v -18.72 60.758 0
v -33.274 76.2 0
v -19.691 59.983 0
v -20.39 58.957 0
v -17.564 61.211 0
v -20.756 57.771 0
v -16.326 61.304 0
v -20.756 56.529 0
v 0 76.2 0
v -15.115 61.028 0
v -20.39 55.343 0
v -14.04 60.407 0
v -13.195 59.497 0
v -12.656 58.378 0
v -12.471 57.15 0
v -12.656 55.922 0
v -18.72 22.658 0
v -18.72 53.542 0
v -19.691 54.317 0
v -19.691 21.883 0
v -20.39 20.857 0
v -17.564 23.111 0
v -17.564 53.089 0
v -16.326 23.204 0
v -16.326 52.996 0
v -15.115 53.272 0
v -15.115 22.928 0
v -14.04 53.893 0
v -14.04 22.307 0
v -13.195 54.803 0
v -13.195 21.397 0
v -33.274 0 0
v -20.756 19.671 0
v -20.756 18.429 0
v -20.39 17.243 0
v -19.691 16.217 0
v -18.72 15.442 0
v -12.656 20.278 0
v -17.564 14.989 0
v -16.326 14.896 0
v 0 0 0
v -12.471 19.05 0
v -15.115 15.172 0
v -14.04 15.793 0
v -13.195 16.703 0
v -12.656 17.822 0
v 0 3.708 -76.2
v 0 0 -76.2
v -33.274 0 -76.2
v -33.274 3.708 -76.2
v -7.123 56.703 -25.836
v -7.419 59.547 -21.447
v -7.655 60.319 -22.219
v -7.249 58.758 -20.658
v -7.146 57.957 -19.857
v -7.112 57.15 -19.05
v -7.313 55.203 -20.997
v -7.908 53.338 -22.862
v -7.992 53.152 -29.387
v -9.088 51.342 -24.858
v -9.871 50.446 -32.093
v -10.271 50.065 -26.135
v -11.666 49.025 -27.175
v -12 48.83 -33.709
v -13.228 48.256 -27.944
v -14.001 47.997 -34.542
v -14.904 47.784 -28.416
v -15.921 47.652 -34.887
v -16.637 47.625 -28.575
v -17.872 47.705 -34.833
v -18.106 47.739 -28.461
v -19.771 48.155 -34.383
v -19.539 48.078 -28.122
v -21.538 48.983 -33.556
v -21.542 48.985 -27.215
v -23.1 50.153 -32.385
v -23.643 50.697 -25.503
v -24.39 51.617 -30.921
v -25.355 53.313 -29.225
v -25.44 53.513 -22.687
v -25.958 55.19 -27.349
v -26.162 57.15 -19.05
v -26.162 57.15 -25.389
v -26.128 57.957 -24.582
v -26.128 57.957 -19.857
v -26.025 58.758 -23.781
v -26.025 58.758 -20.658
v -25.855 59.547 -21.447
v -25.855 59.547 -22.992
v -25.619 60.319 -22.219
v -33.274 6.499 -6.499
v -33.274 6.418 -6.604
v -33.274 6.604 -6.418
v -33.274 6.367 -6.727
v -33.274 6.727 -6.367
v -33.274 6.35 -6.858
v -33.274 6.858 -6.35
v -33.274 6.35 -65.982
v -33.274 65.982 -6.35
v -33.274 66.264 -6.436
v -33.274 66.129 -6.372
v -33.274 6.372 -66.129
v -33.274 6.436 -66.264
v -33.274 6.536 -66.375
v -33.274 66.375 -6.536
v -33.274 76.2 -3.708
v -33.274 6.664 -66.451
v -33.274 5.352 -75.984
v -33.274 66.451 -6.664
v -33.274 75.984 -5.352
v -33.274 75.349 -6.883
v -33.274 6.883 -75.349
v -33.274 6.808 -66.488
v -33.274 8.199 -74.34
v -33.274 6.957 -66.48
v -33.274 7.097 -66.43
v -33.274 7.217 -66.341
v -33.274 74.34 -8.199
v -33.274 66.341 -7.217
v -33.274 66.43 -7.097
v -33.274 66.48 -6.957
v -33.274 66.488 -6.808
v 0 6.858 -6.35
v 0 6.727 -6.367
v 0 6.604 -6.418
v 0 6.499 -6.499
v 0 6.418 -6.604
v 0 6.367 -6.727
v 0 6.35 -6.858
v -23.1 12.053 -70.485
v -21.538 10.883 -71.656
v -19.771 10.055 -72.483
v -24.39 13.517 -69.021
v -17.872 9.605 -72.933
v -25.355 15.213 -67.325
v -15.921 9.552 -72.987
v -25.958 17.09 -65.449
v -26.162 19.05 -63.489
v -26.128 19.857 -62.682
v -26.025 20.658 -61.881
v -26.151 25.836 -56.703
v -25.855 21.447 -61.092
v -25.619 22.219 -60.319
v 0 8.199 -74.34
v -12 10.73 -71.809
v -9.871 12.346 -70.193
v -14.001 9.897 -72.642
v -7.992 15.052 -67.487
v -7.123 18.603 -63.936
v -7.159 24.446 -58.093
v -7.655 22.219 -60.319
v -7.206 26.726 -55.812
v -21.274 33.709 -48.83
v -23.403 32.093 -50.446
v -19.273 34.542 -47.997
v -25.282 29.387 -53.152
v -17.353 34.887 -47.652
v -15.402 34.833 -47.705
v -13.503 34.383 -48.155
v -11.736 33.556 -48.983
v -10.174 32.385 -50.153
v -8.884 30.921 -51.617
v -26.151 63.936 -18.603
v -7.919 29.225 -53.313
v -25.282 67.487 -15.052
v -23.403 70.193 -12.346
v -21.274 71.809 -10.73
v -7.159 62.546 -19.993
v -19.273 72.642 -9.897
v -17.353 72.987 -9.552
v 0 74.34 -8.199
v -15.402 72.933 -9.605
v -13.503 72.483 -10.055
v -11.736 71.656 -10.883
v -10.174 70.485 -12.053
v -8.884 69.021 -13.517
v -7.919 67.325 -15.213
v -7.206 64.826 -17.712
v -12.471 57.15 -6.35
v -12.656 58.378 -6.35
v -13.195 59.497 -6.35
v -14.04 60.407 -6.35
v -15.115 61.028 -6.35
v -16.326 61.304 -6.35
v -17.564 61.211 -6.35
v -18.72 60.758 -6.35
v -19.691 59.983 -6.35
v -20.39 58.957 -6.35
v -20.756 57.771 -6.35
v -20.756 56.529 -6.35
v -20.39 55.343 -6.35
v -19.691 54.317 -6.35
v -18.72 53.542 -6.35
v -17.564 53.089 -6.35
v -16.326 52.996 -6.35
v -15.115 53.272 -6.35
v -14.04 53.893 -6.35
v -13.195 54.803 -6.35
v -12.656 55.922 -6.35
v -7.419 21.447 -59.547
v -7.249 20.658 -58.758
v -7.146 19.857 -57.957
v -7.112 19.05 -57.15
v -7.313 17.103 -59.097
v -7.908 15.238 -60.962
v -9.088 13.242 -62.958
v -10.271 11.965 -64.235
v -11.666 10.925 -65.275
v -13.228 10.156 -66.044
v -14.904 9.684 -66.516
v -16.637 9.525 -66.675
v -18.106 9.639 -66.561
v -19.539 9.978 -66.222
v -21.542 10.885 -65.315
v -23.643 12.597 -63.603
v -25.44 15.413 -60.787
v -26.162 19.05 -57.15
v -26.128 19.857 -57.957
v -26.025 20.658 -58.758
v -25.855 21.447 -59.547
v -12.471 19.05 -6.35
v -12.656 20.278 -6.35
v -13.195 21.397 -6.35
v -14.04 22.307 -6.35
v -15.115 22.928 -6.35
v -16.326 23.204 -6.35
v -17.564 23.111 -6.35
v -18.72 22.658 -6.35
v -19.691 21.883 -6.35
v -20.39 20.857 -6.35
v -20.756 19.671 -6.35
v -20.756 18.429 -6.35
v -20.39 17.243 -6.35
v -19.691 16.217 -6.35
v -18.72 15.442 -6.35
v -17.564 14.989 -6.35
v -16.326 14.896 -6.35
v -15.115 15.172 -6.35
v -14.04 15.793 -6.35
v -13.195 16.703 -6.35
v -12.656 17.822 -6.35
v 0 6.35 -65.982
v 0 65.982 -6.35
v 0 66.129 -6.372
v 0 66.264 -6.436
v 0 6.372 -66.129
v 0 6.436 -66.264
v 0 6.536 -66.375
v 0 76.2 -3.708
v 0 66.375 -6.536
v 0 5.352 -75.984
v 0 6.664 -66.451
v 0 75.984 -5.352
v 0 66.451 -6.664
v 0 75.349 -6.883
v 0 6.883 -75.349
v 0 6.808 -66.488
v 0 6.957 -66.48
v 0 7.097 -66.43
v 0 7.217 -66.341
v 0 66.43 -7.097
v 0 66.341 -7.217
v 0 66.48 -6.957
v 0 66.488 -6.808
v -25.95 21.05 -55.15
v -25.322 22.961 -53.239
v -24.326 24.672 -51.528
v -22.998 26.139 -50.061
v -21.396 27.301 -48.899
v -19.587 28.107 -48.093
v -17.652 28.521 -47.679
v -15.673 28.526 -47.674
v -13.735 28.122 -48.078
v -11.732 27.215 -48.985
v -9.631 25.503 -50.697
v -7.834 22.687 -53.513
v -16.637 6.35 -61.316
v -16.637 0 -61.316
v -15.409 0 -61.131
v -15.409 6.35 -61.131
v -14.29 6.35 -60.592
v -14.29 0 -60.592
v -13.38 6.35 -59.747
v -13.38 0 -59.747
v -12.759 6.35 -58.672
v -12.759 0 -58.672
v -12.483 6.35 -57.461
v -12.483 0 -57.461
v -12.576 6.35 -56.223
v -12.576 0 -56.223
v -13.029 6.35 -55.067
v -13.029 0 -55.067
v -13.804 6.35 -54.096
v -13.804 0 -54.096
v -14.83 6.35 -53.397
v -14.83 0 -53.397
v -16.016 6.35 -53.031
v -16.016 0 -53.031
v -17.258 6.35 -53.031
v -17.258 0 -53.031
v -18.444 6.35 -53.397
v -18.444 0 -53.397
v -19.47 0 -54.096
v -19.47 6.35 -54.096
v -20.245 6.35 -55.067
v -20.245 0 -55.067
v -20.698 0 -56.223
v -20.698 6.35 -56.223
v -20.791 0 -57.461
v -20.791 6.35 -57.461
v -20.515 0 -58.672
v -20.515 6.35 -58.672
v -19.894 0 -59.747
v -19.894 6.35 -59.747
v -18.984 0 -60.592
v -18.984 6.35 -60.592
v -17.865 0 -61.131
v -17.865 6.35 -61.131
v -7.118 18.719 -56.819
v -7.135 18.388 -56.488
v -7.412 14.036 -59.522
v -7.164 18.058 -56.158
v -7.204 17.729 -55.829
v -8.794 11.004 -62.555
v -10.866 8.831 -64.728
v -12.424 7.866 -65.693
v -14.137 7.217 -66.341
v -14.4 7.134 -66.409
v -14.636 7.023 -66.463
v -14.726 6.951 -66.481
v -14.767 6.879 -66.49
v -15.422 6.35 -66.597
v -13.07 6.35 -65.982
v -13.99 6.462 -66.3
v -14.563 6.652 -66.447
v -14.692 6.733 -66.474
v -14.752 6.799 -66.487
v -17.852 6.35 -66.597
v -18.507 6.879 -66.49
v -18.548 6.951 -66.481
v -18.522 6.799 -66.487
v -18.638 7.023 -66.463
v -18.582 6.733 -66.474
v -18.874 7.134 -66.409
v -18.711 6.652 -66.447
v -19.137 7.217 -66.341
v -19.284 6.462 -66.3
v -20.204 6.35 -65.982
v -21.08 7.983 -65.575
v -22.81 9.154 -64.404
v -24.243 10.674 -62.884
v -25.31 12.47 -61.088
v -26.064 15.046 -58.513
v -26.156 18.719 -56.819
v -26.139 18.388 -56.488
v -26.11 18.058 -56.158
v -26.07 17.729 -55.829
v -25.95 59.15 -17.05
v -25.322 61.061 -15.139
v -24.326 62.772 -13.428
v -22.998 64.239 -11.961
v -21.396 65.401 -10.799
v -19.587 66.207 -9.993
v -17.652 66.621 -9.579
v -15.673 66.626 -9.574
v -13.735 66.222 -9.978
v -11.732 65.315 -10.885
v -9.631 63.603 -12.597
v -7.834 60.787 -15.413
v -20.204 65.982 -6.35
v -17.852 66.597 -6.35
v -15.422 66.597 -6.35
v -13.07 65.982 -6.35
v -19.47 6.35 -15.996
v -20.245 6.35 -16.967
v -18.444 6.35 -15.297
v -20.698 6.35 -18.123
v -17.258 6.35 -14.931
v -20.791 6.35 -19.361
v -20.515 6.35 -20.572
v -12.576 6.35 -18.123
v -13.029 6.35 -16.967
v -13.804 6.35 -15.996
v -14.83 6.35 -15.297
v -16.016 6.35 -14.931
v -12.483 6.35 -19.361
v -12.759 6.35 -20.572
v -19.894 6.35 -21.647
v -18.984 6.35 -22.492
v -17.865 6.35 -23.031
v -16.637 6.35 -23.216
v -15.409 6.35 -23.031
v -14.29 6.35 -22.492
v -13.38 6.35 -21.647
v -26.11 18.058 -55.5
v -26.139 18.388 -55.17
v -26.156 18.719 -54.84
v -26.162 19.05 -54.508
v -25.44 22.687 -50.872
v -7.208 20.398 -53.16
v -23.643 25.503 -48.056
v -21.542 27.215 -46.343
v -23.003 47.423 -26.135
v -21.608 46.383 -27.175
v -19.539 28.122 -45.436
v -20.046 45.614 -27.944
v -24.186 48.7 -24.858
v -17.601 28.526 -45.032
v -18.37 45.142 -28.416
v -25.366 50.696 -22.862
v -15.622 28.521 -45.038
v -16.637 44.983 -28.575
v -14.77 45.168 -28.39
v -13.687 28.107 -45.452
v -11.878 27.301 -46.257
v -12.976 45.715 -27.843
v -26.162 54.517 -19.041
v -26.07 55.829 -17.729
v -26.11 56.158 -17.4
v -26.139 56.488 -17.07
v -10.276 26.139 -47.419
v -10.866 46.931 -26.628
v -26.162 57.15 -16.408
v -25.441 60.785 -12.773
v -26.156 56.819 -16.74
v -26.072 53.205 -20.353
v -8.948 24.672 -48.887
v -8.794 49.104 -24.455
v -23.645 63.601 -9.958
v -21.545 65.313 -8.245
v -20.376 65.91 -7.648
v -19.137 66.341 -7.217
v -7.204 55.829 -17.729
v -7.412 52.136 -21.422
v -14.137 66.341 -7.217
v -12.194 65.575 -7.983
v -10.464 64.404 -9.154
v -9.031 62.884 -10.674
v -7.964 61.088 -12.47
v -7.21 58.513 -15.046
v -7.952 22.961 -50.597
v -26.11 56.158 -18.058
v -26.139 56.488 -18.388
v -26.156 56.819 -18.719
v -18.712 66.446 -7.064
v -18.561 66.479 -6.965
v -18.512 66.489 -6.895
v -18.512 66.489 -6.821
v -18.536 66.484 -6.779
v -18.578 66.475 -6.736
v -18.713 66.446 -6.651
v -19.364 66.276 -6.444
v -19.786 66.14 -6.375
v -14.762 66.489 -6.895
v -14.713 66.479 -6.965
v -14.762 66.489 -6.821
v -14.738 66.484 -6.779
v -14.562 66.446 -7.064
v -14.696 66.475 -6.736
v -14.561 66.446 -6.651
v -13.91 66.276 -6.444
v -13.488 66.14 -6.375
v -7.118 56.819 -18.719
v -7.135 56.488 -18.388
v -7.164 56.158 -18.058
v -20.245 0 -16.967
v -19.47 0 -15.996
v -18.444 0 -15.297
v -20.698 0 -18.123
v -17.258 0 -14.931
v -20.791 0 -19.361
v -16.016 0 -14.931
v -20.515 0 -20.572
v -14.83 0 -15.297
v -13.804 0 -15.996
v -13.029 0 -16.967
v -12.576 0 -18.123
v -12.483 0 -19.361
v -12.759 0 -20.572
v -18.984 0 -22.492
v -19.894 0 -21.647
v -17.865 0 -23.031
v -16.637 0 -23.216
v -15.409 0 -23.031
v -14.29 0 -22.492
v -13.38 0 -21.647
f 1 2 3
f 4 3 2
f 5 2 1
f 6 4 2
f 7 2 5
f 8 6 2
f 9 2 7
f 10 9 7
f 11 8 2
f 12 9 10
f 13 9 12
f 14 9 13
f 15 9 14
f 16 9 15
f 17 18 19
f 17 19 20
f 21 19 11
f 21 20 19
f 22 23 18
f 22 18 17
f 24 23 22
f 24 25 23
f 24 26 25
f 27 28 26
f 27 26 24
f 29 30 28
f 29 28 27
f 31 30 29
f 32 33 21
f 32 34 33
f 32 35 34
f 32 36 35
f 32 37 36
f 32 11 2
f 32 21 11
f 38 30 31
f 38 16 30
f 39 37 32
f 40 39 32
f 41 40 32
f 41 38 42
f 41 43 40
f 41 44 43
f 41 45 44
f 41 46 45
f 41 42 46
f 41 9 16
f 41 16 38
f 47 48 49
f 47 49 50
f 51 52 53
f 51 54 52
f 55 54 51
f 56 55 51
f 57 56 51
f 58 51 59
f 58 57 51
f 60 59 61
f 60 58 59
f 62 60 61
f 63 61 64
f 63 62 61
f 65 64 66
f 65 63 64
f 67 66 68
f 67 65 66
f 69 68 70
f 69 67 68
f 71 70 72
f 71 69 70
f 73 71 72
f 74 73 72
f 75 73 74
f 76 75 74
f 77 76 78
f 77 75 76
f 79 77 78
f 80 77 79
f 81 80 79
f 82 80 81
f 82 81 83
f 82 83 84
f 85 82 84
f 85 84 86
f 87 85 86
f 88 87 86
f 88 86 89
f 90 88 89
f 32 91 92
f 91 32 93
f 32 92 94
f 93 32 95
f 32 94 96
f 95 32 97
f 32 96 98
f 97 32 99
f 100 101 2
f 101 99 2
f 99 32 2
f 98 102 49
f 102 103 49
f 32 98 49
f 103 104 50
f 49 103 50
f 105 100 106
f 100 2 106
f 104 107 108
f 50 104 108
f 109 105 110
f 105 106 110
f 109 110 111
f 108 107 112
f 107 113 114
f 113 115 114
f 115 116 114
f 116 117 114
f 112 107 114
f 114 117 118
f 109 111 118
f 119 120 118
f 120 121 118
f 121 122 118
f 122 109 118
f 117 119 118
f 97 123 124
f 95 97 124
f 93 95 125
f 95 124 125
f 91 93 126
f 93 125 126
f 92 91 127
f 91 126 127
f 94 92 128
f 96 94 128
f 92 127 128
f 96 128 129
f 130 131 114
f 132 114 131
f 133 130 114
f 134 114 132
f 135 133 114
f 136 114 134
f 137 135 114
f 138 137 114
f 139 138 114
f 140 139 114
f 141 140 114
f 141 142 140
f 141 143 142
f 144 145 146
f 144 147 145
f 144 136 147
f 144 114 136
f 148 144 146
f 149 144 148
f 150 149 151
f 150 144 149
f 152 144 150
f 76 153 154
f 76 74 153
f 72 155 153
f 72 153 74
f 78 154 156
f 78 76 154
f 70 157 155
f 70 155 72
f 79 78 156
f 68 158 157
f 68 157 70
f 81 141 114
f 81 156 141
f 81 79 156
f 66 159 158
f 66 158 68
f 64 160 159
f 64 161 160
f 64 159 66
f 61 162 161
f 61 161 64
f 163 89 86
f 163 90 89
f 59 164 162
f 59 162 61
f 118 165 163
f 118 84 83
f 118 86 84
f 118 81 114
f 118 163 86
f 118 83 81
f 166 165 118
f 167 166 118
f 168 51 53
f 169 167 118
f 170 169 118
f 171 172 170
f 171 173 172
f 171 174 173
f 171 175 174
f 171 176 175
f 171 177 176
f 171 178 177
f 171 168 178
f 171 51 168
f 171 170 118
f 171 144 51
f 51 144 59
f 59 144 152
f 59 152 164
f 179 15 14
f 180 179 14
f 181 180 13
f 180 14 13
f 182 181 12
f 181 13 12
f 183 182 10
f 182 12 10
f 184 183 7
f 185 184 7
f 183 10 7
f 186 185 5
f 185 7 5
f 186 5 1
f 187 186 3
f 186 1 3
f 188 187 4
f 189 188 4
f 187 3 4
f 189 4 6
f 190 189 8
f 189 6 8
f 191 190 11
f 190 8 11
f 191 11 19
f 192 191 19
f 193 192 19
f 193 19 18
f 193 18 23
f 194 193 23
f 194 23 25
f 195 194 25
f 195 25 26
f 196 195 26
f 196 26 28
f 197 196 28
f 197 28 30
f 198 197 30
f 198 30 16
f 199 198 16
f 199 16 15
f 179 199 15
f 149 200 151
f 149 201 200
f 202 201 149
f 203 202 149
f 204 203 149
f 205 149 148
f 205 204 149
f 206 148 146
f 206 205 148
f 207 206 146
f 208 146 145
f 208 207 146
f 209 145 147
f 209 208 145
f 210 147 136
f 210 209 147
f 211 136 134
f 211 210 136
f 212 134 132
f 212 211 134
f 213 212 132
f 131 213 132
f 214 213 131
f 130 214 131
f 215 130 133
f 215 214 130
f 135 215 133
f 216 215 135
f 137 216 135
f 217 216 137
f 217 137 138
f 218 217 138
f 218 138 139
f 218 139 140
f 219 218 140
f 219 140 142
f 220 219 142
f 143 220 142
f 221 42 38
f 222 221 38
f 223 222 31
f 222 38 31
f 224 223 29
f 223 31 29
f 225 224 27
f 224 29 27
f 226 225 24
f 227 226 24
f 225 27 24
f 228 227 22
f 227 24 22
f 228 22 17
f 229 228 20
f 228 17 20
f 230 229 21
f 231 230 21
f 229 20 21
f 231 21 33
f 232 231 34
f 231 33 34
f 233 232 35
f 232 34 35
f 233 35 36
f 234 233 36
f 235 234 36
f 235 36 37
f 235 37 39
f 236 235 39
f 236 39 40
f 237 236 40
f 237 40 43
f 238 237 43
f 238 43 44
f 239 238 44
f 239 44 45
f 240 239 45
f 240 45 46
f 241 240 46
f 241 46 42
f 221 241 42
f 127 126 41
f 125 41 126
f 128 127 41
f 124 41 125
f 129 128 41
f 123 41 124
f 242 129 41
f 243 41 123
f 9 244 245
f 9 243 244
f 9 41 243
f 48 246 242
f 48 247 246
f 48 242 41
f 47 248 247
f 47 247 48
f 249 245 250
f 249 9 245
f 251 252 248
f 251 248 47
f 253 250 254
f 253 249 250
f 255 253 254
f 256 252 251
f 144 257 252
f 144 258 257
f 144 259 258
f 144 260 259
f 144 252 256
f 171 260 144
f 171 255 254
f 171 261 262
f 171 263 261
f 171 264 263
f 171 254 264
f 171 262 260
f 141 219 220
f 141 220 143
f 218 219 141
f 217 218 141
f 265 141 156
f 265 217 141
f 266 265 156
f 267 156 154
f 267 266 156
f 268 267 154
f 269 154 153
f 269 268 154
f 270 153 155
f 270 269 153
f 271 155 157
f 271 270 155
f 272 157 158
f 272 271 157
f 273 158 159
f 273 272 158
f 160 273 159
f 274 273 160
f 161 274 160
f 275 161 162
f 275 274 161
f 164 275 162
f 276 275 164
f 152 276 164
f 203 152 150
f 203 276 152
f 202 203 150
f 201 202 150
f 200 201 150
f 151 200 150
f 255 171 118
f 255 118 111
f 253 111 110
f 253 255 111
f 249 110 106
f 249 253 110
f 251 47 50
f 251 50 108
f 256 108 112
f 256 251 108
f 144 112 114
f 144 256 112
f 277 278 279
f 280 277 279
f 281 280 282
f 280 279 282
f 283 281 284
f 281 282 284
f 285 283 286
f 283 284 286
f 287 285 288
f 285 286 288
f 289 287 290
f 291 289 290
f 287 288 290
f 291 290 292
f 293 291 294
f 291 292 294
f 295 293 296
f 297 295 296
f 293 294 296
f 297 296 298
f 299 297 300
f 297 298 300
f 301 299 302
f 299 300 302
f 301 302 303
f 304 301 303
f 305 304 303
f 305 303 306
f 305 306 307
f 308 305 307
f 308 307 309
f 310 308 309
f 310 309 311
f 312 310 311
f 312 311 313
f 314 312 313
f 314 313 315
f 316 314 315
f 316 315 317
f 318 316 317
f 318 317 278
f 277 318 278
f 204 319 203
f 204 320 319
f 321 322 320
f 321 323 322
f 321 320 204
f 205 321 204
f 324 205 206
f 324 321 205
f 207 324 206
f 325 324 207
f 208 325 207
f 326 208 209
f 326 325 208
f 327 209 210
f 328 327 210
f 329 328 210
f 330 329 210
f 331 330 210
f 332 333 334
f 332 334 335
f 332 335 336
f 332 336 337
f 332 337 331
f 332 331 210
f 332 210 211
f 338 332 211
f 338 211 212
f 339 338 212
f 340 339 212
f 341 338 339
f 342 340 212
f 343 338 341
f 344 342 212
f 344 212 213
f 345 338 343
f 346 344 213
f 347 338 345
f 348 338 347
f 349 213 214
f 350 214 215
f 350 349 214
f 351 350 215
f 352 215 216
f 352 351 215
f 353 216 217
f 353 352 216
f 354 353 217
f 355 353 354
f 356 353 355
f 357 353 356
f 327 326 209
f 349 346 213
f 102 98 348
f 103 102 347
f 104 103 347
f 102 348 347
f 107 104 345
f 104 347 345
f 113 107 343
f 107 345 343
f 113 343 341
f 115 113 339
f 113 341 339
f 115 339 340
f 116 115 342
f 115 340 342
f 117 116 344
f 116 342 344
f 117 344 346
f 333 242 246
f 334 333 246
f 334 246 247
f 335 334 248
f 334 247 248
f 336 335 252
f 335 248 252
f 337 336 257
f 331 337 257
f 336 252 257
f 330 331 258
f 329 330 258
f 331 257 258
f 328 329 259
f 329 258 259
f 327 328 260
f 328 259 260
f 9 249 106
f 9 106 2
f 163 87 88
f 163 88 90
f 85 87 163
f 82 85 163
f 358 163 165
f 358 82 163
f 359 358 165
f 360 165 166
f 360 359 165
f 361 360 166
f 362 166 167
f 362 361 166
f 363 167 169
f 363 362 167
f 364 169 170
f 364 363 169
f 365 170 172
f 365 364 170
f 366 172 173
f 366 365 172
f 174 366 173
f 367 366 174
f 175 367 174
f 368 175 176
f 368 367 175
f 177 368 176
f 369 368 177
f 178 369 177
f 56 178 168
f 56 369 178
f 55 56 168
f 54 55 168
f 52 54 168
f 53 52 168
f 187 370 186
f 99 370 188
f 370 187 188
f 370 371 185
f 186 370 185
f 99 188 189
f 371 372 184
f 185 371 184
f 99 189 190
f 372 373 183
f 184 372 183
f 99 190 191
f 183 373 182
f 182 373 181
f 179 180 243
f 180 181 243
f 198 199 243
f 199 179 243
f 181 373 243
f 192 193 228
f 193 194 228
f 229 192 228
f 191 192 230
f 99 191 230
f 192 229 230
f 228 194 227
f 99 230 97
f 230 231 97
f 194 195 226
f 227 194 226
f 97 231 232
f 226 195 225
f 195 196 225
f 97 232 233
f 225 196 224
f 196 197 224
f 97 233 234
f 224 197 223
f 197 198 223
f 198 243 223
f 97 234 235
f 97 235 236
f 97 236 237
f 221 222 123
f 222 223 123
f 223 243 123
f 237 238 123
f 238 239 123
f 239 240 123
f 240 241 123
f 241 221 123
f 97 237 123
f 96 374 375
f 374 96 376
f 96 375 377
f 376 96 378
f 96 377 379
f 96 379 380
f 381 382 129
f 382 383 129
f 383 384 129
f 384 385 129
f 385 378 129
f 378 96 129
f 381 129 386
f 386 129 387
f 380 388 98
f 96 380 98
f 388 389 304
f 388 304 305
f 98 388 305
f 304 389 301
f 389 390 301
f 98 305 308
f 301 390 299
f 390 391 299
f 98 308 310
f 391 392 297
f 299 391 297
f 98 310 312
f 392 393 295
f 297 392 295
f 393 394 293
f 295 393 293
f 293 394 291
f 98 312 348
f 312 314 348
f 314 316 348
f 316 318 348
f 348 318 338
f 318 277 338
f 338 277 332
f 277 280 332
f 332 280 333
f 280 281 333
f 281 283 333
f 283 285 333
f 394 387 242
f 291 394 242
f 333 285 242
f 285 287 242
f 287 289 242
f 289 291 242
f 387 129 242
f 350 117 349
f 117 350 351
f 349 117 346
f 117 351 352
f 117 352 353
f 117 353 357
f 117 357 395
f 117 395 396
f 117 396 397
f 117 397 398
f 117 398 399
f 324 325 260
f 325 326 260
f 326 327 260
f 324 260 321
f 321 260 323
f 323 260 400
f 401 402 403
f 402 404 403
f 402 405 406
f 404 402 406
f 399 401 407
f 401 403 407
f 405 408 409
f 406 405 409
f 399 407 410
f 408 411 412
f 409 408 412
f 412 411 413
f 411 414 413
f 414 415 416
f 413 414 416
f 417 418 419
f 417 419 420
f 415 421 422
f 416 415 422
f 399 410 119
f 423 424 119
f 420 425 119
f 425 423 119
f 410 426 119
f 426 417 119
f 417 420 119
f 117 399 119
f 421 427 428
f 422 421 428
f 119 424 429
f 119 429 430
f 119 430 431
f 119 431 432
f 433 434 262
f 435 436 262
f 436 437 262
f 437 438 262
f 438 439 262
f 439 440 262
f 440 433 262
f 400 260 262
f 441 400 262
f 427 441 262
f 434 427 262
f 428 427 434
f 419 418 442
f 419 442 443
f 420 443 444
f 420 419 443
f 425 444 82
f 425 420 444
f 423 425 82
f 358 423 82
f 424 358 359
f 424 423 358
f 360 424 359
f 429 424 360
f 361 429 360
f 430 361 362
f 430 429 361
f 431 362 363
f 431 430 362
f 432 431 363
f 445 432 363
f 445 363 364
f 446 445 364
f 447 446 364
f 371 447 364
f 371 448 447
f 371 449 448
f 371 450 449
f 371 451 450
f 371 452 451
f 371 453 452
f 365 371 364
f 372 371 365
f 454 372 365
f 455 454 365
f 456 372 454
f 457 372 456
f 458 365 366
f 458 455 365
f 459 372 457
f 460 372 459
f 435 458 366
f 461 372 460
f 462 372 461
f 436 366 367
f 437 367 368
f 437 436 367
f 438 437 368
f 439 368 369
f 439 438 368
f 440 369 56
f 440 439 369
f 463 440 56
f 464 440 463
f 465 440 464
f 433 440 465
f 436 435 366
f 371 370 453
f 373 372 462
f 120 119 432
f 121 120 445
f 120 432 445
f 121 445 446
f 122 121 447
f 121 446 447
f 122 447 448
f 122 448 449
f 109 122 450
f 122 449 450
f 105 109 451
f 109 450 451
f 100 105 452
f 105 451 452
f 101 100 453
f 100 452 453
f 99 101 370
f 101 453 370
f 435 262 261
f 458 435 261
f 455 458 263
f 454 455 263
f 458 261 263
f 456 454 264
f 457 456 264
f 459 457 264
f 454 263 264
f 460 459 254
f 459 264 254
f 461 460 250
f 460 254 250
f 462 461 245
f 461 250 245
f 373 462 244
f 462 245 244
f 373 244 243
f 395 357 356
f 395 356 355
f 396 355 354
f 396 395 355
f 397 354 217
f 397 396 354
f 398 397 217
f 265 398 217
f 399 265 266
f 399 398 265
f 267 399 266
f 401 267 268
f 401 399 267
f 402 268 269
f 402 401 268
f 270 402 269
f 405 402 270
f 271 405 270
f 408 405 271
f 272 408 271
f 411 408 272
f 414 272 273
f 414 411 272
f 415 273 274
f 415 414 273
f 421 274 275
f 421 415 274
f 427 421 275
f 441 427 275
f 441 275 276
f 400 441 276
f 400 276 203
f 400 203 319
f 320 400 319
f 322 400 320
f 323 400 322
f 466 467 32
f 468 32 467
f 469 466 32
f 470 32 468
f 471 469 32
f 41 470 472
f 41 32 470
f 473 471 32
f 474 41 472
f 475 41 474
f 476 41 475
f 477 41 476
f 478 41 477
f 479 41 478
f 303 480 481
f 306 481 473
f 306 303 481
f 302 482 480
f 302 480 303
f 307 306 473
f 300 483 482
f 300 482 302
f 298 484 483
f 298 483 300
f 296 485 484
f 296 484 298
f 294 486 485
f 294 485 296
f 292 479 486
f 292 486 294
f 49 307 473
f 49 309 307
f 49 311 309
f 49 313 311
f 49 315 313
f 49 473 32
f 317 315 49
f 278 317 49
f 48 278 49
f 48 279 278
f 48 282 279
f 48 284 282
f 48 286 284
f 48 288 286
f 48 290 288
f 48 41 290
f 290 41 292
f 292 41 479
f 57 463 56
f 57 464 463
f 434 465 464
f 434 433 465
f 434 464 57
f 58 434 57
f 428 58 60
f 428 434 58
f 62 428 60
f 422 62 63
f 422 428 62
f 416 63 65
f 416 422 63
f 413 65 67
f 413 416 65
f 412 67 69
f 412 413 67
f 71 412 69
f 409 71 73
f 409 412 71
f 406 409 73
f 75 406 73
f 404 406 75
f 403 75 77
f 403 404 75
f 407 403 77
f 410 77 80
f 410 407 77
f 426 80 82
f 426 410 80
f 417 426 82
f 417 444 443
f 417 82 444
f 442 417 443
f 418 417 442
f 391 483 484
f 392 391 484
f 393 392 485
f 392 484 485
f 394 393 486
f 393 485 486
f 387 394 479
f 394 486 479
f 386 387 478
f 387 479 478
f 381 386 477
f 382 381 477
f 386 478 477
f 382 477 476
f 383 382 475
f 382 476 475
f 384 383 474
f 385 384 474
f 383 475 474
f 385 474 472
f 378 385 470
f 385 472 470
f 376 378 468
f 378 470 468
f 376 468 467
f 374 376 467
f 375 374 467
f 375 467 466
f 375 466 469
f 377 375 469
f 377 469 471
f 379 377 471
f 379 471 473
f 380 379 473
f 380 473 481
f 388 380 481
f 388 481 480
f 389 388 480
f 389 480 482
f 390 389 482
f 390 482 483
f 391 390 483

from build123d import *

# Parameters (mm, degrees)
BASE_EXTRUDE_DEPTH       = 33.274
HOLE1_REACH              = 114.783
SKETCH2_R                = 4.1656
SKETCH3_R                = 9.525
HOLE1A_DEPTH             = 109.593838
HOLE1_PATTERN_COUNT      = 2
HOLE1_PATTERN_PITCH      = 38.1
HOLE1_PATTERN_COUNT_DIR2 = 2
HOLE1_PATTERN_PITCH_DIR2 = 38.1
HOLE2_REACH              = 114.783
SKETCH4_R                = 4.1656
SKETCH5_R                = 9.525
HOLE2A_DEPTH             = 109.593838
HOLE2_PATTERN_COUNT      = 2
HOLE2_PATTERN_PITCH      = 38.1
HOLE2_PATTERN_COUNT_DIR2 = 2
HOLE2_PATTERN_PITCH_DIR2 = 38.1


with BuildPart() as part:
    # Sketch1 → Base Extrude (new body)
    with BuildSketch(Plane(origin=(0, 0, 0), x_dir=(0, 0, -1), z_dir=(1, 0, 0))):
        with BuildLine():
            Line((0, 76.2), (0, 0))
            Line((0, 0), (76.2, 0))
            Line((76.2, 0), (76.2, 3.7084))
            ThreePointArc((76.2, 3.7084), (75.716635, 6.13844), (74.340128, 8.198528))
            Line((74.340128, 8.198528), (8.198528, 74.340128))
            ThreePointArc((8.198528, 74.340128), (6.13844, 75.716635), (3.7084, 76.2))
            Line((3.7084, 76.2), (0, 76.2))
        make_face()
        with BuildLine():
            Line((6.35, 65.98198), (6.35, 6.858))
            ThreePointArc((6.35, 6.858), (6.49879, 6.49879), (6.858, 6.35))
            Line((6.858, 6.35), (65.98198, 6.35))
            ThreePointArc((65.98198, 6.35), (66.45131, 6.663597), (66.34119, 7.21721))
            Line((66.34119, 7.21721), (7.21721, 66.34119))
            ThreePointArc((7.21721, 66.34119), (6.663597, 66.45131), (6.35, 65.98198))
        make_face(mode=Mode.SUBTRACT)
    extrude(amount=-BASE_EXTRUDE_DEPTH)

    # Sketch2 → Hole1 (cut, up to next)
    with BuildSketch(Plane.XZ, mode=Mode.PRIVATE) as hole1_sk1:
        with Locations(Location((-16.637, -19.05, 0), (0, 0, 270))):
            Circle(SKETCH2_R)
    hole1_tool1 = extrude(hole1_sk1.sketch, amount=-HOLE1_REACH, mode=Mode.PRIVATE) & part.part
    hole1 = hole1_tool1.solids().sort_by_distance((-16.637, 0, -19.05))[0]
    add(hole1, mode=Mode.SUBTRACT)

    # Sketch3 → Hole1a (cut, through all)
    with BuildSketch(Plane(origin=(0, 6.35, 0), x_dir=(-1, 0, 0), z_dir=(0, 1, 0))):
        with Locations(Location((16.637, -19.05, 0), (0, 0, 270))):
            Circle(SKETCH3_R)
    hole1a = extrude(amount=HOLE1A_DEPTH, mode=Mode.SUBTRACT)

    # Hole1 Pattern: Hole1, Hole1a 2 × 2
    with Locations(*[(i * HOLE1_PATTERN_PITCH, 0, -j * HOLE1_PATTERN_PITCH_DIR2) for i in range(HOLE1_PATTERN_COUNT) for j in range(HOLE1_PATTERN_COUNT_DIR2) if (i, j) != (0, 0)]):
        add(hole1, mode=Mode.SUBTRACT)
        add(hole1a, mode=Mode.SUBTRACT)

    # Sketch4 → Hole2 (cut, up to next)
    with BuildSketch(Plane.XY, mode=Mode.PRIVATE) as hole2_sk1:
        with Locations((-16.637, 19.05)):
            Circle(SKETCH4_R)
    hole2_tool1 = extrude(hole2_sk1.sketch, amount=-HOLE2_REACH, mode=Mode.PRIVATE) & part.part
    hole2 = hole2_tool1.solids().sort_by_distance((-16.637, 19.05, 0))[0]
    add(hole2, mode=Mode.SUBTRACT)

    # Sketch5 → Hole2a (cut, through all)
    with BuildSketch(Plane(origin=(0, 0, -6.35), x_dir=(-1, 0, 0), z_dir=(0, 0, -1))):
        with Locations((16.637, 19.05)):
            Circle(SKETCH5_R)
    hole2a = extrude(amount=HOLE2A_DEPTH, mode=Mode.SUBTRACT)

    # Hole2 Pattern: Hole2, Hole2a 2 × 2
    with Locations(*[(i * HOLE2_PATTERN_PITCH, j * HOLE2_PATTERN_PITCH_DIR2, 0) for i in range(HOLE2_PATTERN_COUNT) for j in range(HOLE2_PATTERN_COUNT_DIR2) if (i, j) != (0, 0)]):
        add(hole2, mode=Mode.SUBTRACT)
        add(hole2a, mode=Mode.SUBTRACT)


solid = part.part
